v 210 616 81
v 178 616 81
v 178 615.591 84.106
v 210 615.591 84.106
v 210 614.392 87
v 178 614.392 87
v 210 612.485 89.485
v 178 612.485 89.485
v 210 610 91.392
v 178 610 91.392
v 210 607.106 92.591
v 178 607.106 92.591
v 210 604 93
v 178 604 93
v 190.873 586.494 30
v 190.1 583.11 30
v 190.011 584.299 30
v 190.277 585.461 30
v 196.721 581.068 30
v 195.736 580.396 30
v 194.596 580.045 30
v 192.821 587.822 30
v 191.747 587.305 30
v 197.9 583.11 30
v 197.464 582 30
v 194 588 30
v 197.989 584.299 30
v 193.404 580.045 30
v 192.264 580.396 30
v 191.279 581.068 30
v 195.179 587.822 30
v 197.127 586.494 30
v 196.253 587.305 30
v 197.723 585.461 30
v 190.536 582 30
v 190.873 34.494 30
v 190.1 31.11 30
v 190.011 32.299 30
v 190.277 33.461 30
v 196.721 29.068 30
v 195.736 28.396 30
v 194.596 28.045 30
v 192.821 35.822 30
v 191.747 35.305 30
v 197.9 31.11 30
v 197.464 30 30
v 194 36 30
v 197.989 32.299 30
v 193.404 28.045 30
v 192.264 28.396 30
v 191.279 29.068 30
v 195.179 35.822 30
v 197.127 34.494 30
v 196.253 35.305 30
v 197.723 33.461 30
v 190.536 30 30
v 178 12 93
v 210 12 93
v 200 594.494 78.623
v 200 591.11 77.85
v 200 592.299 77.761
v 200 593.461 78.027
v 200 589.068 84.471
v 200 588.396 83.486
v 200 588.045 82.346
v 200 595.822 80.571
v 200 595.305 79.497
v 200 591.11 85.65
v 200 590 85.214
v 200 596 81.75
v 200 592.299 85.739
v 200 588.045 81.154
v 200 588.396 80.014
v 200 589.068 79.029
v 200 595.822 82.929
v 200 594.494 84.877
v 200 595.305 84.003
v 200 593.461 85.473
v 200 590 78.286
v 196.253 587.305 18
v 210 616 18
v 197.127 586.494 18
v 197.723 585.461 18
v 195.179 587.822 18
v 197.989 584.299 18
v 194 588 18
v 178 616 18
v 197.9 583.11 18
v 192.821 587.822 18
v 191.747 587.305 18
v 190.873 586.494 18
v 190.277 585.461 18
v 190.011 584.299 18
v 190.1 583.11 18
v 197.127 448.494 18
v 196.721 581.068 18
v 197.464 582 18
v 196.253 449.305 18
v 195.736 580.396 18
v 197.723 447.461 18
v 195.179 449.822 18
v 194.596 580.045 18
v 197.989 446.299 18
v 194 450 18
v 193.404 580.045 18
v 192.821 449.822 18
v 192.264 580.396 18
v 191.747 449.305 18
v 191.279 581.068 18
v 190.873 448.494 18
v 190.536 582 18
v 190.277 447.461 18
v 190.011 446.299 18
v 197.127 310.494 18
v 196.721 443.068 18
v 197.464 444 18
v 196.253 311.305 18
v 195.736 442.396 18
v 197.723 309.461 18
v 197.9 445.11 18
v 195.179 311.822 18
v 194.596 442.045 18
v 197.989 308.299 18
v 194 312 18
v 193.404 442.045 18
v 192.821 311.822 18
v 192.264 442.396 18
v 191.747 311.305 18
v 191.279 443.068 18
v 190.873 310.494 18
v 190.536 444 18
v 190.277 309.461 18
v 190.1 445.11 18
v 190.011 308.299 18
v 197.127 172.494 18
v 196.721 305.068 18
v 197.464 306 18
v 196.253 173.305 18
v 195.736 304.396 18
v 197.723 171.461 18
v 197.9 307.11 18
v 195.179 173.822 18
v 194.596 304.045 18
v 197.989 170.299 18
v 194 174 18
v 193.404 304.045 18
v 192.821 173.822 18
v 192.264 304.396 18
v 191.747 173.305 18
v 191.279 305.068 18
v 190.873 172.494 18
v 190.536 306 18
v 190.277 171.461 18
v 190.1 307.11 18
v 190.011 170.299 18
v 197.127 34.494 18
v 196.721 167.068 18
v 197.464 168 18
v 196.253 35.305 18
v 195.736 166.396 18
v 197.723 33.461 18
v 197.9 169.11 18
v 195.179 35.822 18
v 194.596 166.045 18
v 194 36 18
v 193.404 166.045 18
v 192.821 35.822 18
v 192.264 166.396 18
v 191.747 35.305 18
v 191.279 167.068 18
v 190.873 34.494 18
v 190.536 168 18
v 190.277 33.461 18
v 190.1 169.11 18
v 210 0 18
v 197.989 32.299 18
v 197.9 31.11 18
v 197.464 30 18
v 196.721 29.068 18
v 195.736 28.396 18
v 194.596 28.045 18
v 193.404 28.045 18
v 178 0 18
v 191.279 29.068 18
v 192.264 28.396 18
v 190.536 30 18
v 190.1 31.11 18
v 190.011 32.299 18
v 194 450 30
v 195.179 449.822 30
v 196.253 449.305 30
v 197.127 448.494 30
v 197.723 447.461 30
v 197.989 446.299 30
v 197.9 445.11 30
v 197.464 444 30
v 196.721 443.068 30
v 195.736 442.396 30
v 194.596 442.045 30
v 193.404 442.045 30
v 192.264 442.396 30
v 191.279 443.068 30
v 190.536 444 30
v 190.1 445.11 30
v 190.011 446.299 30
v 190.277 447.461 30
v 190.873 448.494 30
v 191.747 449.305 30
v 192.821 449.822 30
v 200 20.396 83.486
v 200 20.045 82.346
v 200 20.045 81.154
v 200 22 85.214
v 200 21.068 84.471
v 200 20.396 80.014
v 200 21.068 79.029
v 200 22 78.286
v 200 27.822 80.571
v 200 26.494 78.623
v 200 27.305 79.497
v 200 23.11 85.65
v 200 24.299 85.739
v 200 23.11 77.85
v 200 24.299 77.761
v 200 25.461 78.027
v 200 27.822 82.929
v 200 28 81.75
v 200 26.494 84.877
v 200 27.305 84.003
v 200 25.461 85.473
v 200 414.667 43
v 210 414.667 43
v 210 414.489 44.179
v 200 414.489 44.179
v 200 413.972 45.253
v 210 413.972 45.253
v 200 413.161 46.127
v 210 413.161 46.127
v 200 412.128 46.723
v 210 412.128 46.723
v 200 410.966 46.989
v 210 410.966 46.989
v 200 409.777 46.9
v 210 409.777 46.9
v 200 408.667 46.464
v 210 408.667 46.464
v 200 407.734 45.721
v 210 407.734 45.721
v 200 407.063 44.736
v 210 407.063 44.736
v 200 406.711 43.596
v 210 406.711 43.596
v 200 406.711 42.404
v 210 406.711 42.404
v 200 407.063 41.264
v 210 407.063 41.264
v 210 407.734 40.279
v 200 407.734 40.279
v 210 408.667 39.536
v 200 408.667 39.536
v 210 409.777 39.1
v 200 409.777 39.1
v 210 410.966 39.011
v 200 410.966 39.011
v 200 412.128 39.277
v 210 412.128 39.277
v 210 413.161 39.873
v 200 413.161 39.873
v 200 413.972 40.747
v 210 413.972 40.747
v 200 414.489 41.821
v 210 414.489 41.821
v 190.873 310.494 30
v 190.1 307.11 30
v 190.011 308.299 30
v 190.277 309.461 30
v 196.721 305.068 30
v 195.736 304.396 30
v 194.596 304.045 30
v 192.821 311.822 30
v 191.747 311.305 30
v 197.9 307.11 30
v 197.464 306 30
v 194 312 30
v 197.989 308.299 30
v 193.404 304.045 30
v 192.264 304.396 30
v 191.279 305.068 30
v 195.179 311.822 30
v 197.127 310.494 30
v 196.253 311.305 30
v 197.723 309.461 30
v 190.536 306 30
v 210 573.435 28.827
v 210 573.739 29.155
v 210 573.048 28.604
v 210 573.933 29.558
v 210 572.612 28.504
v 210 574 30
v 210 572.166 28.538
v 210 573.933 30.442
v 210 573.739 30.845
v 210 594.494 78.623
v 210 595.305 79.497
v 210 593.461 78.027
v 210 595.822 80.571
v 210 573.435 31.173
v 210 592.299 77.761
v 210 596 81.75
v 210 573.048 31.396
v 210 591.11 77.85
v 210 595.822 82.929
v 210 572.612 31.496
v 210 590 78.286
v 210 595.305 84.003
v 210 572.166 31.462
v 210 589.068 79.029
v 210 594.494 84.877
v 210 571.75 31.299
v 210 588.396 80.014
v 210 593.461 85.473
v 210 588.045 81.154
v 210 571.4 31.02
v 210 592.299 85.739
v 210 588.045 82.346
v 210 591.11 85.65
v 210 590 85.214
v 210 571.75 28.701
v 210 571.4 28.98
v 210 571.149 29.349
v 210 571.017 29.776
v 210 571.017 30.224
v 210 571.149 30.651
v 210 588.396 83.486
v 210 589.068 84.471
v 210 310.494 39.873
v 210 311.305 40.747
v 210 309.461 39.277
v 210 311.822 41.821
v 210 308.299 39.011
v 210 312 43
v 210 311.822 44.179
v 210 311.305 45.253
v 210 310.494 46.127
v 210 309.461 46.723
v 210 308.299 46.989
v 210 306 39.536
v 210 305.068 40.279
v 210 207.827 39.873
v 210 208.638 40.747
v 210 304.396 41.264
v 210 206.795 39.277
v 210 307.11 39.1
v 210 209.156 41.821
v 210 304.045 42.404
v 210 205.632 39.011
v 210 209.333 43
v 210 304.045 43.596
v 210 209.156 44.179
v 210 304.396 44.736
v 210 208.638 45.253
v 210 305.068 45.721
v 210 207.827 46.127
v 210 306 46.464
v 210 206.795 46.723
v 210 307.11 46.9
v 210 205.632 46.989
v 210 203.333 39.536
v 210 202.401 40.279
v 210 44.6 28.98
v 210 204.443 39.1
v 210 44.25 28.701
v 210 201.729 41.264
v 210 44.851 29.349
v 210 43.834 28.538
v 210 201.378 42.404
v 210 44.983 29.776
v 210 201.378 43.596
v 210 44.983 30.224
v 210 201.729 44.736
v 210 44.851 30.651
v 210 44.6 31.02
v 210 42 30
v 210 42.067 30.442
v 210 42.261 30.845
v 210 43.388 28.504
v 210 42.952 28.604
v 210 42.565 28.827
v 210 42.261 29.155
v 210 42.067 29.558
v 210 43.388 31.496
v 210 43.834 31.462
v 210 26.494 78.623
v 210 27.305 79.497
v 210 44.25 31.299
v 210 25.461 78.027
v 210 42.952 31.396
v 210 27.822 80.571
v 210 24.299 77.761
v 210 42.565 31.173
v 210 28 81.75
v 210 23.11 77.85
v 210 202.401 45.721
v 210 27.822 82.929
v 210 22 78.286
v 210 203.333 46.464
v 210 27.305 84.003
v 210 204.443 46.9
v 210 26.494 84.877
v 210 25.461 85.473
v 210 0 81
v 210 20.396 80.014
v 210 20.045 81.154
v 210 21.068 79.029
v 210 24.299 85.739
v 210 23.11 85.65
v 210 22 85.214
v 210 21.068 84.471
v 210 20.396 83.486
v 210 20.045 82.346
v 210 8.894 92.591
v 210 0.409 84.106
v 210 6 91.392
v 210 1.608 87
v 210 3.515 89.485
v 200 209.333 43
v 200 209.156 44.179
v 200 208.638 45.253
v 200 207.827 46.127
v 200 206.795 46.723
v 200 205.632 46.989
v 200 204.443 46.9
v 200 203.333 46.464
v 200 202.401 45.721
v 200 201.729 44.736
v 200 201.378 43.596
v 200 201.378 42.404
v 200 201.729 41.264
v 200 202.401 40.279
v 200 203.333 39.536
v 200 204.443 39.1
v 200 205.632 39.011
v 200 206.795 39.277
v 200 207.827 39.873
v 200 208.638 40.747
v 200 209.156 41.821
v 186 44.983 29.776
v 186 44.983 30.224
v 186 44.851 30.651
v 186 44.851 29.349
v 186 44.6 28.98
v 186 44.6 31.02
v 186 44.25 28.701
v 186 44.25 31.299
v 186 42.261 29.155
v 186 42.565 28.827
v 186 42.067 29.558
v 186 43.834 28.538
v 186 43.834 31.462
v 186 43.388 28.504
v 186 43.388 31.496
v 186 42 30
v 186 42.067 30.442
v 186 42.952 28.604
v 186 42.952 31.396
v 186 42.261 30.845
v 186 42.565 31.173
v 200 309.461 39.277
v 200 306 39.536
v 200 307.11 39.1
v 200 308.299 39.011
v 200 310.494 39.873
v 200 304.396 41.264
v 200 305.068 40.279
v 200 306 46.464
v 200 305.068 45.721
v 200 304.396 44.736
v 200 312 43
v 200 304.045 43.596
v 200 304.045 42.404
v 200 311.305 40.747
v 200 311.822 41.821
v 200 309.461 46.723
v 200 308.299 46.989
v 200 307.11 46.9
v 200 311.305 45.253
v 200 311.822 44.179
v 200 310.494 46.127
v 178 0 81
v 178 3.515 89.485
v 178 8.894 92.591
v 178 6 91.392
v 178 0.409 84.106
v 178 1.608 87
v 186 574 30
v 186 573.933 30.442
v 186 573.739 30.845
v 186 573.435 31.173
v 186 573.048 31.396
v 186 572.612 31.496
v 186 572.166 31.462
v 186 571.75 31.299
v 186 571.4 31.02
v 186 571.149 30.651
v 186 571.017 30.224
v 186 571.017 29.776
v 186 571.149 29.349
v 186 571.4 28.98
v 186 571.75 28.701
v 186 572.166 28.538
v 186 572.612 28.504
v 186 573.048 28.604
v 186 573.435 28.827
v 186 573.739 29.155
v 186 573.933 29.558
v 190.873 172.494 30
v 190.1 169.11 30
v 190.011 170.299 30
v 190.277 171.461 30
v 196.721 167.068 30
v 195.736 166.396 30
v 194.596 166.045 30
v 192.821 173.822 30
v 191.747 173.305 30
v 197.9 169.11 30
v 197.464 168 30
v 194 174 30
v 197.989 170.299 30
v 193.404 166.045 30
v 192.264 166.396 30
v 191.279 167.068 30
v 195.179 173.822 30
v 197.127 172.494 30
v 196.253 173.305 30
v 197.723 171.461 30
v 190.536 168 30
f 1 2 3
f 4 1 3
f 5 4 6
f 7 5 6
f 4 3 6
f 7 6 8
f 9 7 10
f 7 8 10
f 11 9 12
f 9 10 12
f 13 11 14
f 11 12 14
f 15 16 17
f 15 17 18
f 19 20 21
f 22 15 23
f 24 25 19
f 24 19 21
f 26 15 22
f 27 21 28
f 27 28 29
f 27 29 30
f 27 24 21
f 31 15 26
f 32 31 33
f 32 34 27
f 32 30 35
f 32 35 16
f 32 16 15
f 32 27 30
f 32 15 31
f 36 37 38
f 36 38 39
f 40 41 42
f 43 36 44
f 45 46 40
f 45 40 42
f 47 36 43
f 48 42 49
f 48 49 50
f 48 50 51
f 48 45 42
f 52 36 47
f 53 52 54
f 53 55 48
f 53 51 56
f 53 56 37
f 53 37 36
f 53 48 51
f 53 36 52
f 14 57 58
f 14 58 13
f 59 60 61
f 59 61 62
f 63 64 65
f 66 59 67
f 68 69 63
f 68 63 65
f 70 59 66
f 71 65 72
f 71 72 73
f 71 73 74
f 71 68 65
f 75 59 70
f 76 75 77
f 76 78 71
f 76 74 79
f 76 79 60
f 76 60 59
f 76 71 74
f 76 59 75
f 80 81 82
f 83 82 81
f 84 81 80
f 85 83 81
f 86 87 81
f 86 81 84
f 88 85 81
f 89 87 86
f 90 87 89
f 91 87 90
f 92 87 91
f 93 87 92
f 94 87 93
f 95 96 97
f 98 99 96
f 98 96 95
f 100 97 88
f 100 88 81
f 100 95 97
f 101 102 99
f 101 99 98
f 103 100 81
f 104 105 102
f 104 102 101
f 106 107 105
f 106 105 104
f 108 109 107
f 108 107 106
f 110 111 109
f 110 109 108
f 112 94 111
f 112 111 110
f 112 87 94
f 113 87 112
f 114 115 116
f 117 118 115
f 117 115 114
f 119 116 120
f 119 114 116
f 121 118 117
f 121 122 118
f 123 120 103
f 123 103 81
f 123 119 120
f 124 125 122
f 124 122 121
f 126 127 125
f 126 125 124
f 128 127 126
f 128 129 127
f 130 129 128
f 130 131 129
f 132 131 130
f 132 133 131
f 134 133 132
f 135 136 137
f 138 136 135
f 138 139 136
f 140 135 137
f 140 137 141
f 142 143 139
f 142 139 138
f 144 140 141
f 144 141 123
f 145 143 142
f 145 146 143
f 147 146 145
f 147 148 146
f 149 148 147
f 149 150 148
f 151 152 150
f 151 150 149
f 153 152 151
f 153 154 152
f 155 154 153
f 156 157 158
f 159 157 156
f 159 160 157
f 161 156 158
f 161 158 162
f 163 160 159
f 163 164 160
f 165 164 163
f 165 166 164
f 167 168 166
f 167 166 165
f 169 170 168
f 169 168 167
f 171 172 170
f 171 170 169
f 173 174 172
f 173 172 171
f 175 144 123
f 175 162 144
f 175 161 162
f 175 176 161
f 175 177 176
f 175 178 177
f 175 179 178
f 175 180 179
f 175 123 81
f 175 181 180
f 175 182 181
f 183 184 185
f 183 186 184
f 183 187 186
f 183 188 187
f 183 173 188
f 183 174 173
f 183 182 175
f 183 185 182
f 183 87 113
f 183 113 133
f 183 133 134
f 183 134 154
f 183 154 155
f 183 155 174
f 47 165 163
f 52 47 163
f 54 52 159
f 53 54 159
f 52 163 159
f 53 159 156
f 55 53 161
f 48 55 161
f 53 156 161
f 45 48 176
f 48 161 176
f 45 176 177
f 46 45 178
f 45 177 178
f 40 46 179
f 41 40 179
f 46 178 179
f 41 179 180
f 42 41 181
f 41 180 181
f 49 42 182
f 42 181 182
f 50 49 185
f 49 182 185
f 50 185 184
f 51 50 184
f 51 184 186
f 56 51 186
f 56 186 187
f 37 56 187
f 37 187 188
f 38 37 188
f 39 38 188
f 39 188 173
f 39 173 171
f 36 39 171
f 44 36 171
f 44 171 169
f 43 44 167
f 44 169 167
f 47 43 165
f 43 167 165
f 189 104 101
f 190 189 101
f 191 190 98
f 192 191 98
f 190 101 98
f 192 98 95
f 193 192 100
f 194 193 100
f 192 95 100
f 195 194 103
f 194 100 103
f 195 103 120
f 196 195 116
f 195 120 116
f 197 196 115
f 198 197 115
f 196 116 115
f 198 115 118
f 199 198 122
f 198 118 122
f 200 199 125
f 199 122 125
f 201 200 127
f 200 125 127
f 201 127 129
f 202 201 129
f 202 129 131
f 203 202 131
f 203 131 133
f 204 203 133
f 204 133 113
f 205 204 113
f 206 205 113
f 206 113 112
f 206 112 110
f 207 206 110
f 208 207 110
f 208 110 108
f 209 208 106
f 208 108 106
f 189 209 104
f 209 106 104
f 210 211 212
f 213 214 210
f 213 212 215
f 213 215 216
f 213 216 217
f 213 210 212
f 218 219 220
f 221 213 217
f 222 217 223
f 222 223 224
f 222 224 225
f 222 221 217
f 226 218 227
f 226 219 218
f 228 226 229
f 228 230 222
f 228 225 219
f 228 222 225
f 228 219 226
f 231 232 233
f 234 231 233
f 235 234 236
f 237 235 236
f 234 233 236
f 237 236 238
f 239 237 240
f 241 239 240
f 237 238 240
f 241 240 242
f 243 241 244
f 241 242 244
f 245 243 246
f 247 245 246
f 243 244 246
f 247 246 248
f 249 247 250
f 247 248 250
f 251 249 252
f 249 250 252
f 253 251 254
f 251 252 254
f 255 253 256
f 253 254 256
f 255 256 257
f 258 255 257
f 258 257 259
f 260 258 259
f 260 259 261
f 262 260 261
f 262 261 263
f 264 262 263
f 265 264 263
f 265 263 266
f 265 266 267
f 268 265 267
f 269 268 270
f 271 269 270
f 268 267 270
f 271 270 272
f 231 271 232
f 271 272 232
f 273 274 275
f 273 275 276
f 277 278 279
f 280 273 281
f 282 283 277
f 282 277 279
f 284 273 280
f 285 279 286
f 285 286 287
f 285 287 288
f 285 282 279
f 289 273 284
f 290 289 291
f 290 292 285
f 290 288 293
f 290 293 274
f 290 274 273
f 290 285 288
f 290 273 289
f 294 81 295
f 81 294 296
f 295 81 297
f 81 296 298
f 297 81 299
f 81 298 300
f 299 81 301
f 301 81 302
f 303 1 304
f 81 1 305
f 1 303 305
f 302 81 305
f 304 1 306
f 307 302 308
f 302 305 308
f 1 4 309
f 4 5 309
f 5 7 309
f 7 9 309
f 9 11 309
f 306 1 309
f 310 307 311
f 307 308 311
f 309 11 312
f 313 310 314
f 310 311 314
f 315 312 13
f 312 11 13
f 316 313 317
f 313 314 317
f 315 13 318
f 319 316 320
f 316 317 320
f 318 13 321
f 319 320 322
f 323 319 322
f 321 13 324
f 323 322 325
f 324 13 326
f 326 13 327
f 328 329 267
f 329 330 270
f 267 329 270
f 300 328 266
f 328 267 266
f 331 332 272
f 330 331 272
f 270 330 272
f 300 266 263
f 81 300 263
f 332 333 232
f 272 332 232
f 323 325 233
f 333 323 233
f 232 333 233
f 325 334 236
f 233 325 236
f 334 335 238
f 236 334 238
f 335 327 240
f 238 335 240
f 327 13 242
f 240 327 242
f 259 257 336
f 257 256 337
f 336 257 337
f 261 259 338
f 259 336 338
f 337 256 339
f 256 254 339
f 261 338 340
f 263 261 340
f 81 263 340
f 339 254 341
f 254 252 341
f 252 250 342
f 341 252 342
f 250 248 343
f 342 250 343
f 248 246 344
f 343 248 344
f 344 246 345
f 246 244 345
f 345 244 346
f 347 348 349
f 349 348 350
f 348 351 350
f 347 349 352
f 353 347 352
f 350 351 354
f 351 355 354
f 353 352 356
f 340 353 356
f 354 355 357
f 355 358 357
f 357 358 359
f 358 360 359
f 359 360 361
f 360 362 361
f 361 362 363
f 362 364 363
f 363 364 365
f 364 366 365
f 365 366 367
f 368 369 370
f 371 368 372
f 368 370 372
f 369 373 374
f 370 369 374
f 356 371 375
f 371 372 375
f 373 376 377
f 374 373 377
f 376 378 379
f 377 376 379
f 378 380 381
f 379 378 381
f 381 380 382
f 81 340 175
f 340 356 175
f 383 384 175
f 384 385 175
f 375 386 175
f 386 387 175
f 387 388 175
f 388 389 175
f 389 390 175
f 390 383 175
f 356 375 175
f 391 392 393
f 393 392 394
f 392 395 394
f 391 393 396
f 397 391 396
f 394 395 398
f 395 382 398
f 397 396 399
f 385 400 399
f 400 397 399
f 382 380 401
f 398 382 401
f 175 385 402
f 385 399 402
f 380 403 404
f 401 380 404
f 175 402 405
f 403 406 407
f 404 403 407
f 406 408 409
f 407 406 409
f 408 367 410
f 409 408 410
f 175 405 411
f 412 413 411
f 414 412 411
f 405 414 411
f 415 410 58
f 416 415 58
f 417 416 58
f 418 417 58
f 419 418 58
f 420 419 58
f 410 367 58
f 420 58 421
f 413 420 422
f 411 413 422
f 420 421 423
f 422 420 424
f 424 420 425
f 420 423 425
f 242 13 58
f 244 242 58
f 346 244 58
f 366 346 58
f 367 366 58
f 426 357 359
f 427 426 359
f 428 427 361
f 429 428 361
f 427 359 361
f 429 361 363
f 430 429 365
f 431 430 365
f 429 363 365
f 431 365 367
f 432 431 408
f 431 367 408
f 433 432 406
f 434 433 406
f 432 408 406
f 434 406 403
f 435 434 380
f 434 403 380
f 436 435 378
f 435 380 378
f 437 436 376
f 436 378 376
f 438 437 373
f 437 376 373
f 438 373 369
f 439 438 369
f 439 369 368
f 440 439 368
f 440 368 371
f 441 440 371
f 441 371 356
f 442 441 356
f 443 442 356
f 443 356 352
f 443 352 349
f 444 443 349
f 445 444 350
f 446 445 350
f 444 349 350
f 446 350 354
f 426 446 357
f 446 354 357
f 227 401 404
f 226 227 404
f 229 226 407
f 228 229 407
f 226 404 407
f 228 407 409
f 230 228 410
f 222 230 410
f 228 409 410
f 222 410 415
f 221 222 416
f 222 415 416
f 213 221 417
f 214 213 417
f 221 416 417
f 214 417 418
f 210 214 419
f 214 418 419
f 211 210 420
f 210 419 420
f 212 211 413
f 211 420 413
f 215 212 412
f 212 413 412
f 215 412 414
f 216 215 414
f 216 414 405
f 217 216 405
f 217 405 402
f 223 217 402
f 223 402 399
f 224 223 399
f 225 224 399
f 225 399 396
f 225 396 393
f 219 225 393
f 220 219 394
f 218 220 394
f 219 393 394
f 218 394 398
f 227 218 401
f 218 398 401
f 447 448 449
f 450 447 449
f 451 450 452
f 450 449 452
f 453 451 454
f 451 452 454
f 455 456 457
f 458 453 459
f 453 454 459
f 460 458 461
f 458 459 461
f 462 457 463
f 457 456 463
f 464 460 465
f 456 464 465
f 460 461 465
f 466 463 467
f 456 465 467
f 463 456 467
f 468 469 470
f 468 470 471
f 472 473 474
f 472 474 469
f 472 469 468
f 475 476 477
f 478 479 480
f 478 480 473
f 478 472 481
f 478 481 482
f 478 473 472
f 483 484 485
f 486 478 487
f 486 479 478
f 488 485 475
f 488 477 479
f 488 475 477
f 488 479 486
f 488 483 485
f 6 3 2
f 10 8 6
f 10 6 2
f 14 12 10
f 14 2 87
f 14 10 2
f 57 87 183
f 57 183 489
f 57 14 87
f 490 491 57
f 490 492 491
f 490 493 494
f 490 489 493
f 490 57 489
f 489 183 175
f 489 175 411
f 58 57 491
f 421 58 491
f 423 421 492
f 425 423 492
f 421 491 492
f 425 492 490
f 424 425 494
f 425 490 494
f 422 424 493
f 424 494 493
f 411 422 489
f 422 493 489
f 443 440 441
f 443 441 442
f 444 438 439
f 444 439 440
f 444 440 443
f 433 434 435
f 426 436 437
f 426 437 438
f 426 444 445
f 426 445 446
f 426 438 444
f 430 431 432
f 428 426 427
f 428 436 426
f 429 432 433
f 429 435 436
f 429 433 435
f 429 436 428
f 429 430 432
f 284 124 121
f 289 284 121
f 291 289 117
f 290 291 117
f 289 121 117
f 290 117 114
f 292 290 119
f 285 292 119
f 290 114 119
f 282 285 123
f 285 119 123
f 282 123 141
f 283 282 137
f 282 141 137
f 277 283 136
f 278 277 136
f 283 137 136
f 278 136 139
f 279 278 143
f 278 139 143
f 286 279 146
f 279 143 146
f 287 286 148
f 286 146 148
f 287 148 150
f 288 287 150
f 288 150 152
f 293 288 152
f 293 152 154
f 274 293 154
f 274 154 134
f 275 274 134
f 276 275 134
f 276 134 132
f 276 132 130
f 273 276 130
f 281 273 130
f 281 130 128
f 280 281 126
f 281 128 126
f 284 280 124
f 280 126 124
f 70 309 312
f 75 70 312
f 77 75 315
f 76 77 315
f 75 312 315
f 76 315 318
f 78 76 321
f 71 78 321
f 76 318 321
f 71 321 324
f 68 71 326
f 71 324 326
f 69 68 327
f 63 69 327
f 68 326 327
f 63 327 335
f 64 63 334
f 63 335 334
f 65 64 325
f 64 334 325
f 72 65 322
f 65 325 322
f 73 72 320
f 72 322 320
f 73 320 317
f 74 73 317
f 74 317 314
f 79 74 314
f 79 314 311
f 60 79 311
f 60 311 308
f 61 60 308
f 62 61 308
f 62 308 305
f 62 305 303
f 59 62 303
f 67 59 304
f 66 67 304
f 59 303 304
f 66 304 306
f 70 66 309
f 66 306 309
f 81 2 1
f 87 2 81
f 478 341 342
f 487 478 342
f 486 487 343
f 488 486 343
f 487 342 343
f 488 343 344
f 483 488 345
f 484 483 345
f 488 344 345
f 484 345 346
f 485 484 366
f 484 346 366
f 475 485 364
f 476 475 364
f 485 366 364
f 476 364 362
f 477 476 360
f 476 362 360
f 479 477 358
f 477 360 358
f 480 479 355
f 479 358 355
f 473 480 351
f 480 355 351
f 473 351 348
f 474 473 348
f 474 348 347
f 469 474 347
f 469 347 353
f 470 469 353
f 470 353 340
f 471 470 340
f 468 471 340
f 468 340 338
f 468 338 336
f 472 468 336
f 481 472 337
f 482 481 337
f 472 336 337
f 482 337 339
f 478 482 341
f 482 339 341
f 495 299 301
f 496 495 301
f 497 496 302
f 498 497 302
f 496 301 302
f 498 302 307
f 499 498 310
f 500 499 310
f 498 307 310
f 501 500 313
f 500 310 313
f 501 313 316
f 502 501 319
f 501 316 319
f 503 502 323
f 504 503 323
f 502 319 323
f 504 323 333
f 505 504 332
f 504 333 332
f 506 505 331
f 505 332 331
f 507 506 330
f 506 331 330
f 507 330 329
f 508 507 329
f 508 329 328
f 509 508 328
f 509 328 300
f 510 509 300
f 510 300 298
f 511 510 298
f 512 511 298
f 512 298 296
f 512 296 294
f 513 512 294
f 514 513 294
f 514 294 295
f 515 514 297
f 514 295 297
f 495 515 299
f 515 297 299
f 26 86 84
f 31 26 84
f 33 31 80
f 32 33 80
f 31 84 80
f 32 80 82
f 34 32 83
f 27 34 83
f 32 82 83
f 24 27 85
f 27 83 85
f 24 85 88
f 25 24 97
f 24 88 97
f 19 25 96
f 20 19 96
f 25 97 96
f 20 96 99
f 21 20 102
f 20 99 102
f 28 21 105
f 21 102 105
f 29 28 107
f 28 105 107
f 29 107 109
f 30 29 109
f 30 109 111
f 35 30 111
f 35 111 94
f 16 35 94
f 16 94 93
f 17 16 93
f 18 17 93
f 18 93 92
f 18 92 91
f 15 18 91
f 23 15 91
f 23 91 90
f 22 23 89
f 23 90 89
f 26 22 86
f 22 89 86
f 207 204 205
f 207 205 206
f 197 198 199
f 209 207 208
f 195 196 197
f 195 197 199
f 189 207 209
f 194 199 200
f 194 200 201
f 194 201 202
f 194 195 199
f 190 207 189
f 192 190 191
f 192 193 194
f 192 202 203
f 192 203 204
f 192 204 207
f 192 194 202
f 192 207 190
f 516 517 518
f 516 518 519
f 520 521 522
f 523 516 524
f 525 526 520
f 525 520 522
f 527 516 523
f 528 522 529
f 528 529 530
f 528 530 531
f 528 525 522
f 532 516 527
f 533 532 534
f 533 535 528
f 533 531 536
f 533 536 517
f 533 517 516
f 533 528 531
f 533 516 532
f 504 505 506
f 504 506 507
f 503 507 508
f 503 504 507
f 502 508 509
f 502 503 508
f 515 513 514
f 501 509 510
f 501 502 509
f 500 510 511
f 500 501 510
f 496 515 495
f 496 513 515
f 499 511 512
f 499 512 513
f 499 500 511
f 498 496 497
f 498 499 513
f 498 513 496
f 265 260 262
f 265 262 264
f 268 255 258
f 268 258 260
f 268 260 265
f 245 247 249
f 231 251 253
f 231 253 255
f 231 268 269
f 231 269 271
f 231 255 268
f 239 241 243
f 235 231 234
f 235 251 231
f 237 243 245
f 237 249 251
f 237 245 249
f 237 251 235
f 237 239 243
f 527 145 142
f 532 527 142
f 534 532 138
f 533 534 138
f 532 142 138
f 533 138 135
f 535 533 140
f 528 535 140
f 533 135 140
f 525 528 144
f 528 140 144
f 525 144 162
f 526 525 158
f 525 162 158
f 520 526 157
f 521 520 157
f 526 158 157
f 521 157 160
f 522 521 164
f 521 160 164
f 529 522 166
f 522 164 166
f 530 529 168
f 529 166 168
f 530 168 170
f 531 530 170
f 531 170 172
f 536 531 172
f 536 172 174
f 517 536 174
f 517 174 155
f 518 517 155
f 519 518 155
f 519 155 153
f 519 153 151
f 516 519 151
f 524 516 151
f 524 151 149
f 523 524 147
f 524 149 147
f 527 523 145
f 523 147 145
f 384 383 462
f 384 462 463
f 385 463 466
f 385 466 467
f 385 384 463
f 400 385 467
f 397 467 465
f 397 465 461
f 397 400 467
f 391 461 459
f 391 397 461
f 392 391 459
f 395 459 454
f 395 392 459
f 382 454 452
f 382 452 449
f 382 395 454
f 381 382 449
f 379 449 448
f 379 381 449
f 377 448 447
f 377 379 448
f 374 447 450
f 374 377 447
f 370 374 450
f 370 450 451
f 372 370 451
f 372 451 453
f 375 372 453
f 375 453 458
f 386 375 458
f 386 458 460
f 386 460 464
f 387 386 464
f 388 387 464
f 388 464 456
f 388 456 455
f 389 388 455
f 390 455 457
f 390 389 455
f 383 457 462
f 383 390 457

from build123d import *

# Parameters (mm, degrees)
PAD008_DEPTH            = 32
SKETCH017_R             = 1.5
POCKET008_DEPTH         = 24
SKETCH018_R             = 4
POCKET009_DEPTH         = 10
SKETCH019_R             = 4
POCKET010_DEPTH         = 12
LINEARPATTERN003_COUNT  = 5
LINEARPATTERN003_PITCH  = 138
BODY008_ROLL_ANGLE      = 90
BODY008_PLACEMENT_ANGLE = 90


with BuildPart() as part:
    # Sketch016 → Pad008 (new body)
    with BuildSketch(Plane.XY):
        with BuildLine():
            Line((-296, 75), (296, 75))
            ThreePointArc((308, 63), (304.485281, 71.485281), (296, 75))
            Line((308, 63), (308, 0))
            Line((308, 0), (-308, 0))
            Line((-308, 0), (-308, 63))
            ThreePointArc((-296, 75), (-304.485281, 71.485281), (-308, 63))
        make_face()
    extrude(amount=PAD008_DEPTH)

    # Sketch017 (on Face8 of Pad008) → Pocket008 (cut)
    with BuildSketch(Plane.XY.offset(32)):
        with Locations((264.5, 12)):
            Circle(SKETCH017_R)
    pocket008 = extrude(amount=-POCKET008_DEPTH, mode=Mode.SUBTRACT)

    # Mirrored003: Pocket008 across Sketch017 V_Axis
    add(pocket008.mirror(Plane(origin=(0, 0, 32), x_dir=(0, 0, 1), z_dir=(1, 0, 0))), mode=Mode.SUBTRACT)

    # Sketch018 (on Face5 of Mirrored003) → Pocket009 (cut)
    with BuildSketch(Plane.XY.offset(32)):
        with Locations((-284, 63.75)):
            Circle(SKETCH018_R)
        with Locations((284, 63.75)):
            Circle(SKETCH018_R)
        with Locations((-102.666667, 25)):
            Circle(SKETCH018_R)
        with Locations((0, 25)):
            Circle(SKETCH018_R)
        with Locations((102.666667, 25)):
            Circle(SKETCH018_R)
    extrude(amount=-POCKET009_DEPTH, mode=Mode.SUBTRACT)

    # Sketch019 (on Face3 of Pocket009) → Pocket010 (cut)
    with BuildSketch(Plane.XZ):
        with Locations((276, 16)):
            Circle(SKETCH019_R)
    pocket010 = extrude(amount=-POCKET010_DEPTH, mode=Mode.SUBTRACT)

    # LinearPattern003: Pocket010 ×5
    with Locations(*[(-i * LINEARPATTERN003_PITCH, 0, 0) for i in range(1, LINEARPATTERN003_COUNT)]):
        add(pocket010, mode=Mode.SUBTRACT)


with BuildPart() as part_1:
    # Body008 roll: moved
    add(part.part.rotate(Axis((0, 0, 0), (1, 0, 0)), BODY008_ROLL_ANGLE))


with BuildPart() as part_2:
    # Body008 placement: moved
    add(part_1.part.moved(Location((178, 308, 18))).rotate(Axis((178, 308, 18), (0, 0, 1)), BODY008_PLACEMENT_ANGLE))


solid = part_2.part
